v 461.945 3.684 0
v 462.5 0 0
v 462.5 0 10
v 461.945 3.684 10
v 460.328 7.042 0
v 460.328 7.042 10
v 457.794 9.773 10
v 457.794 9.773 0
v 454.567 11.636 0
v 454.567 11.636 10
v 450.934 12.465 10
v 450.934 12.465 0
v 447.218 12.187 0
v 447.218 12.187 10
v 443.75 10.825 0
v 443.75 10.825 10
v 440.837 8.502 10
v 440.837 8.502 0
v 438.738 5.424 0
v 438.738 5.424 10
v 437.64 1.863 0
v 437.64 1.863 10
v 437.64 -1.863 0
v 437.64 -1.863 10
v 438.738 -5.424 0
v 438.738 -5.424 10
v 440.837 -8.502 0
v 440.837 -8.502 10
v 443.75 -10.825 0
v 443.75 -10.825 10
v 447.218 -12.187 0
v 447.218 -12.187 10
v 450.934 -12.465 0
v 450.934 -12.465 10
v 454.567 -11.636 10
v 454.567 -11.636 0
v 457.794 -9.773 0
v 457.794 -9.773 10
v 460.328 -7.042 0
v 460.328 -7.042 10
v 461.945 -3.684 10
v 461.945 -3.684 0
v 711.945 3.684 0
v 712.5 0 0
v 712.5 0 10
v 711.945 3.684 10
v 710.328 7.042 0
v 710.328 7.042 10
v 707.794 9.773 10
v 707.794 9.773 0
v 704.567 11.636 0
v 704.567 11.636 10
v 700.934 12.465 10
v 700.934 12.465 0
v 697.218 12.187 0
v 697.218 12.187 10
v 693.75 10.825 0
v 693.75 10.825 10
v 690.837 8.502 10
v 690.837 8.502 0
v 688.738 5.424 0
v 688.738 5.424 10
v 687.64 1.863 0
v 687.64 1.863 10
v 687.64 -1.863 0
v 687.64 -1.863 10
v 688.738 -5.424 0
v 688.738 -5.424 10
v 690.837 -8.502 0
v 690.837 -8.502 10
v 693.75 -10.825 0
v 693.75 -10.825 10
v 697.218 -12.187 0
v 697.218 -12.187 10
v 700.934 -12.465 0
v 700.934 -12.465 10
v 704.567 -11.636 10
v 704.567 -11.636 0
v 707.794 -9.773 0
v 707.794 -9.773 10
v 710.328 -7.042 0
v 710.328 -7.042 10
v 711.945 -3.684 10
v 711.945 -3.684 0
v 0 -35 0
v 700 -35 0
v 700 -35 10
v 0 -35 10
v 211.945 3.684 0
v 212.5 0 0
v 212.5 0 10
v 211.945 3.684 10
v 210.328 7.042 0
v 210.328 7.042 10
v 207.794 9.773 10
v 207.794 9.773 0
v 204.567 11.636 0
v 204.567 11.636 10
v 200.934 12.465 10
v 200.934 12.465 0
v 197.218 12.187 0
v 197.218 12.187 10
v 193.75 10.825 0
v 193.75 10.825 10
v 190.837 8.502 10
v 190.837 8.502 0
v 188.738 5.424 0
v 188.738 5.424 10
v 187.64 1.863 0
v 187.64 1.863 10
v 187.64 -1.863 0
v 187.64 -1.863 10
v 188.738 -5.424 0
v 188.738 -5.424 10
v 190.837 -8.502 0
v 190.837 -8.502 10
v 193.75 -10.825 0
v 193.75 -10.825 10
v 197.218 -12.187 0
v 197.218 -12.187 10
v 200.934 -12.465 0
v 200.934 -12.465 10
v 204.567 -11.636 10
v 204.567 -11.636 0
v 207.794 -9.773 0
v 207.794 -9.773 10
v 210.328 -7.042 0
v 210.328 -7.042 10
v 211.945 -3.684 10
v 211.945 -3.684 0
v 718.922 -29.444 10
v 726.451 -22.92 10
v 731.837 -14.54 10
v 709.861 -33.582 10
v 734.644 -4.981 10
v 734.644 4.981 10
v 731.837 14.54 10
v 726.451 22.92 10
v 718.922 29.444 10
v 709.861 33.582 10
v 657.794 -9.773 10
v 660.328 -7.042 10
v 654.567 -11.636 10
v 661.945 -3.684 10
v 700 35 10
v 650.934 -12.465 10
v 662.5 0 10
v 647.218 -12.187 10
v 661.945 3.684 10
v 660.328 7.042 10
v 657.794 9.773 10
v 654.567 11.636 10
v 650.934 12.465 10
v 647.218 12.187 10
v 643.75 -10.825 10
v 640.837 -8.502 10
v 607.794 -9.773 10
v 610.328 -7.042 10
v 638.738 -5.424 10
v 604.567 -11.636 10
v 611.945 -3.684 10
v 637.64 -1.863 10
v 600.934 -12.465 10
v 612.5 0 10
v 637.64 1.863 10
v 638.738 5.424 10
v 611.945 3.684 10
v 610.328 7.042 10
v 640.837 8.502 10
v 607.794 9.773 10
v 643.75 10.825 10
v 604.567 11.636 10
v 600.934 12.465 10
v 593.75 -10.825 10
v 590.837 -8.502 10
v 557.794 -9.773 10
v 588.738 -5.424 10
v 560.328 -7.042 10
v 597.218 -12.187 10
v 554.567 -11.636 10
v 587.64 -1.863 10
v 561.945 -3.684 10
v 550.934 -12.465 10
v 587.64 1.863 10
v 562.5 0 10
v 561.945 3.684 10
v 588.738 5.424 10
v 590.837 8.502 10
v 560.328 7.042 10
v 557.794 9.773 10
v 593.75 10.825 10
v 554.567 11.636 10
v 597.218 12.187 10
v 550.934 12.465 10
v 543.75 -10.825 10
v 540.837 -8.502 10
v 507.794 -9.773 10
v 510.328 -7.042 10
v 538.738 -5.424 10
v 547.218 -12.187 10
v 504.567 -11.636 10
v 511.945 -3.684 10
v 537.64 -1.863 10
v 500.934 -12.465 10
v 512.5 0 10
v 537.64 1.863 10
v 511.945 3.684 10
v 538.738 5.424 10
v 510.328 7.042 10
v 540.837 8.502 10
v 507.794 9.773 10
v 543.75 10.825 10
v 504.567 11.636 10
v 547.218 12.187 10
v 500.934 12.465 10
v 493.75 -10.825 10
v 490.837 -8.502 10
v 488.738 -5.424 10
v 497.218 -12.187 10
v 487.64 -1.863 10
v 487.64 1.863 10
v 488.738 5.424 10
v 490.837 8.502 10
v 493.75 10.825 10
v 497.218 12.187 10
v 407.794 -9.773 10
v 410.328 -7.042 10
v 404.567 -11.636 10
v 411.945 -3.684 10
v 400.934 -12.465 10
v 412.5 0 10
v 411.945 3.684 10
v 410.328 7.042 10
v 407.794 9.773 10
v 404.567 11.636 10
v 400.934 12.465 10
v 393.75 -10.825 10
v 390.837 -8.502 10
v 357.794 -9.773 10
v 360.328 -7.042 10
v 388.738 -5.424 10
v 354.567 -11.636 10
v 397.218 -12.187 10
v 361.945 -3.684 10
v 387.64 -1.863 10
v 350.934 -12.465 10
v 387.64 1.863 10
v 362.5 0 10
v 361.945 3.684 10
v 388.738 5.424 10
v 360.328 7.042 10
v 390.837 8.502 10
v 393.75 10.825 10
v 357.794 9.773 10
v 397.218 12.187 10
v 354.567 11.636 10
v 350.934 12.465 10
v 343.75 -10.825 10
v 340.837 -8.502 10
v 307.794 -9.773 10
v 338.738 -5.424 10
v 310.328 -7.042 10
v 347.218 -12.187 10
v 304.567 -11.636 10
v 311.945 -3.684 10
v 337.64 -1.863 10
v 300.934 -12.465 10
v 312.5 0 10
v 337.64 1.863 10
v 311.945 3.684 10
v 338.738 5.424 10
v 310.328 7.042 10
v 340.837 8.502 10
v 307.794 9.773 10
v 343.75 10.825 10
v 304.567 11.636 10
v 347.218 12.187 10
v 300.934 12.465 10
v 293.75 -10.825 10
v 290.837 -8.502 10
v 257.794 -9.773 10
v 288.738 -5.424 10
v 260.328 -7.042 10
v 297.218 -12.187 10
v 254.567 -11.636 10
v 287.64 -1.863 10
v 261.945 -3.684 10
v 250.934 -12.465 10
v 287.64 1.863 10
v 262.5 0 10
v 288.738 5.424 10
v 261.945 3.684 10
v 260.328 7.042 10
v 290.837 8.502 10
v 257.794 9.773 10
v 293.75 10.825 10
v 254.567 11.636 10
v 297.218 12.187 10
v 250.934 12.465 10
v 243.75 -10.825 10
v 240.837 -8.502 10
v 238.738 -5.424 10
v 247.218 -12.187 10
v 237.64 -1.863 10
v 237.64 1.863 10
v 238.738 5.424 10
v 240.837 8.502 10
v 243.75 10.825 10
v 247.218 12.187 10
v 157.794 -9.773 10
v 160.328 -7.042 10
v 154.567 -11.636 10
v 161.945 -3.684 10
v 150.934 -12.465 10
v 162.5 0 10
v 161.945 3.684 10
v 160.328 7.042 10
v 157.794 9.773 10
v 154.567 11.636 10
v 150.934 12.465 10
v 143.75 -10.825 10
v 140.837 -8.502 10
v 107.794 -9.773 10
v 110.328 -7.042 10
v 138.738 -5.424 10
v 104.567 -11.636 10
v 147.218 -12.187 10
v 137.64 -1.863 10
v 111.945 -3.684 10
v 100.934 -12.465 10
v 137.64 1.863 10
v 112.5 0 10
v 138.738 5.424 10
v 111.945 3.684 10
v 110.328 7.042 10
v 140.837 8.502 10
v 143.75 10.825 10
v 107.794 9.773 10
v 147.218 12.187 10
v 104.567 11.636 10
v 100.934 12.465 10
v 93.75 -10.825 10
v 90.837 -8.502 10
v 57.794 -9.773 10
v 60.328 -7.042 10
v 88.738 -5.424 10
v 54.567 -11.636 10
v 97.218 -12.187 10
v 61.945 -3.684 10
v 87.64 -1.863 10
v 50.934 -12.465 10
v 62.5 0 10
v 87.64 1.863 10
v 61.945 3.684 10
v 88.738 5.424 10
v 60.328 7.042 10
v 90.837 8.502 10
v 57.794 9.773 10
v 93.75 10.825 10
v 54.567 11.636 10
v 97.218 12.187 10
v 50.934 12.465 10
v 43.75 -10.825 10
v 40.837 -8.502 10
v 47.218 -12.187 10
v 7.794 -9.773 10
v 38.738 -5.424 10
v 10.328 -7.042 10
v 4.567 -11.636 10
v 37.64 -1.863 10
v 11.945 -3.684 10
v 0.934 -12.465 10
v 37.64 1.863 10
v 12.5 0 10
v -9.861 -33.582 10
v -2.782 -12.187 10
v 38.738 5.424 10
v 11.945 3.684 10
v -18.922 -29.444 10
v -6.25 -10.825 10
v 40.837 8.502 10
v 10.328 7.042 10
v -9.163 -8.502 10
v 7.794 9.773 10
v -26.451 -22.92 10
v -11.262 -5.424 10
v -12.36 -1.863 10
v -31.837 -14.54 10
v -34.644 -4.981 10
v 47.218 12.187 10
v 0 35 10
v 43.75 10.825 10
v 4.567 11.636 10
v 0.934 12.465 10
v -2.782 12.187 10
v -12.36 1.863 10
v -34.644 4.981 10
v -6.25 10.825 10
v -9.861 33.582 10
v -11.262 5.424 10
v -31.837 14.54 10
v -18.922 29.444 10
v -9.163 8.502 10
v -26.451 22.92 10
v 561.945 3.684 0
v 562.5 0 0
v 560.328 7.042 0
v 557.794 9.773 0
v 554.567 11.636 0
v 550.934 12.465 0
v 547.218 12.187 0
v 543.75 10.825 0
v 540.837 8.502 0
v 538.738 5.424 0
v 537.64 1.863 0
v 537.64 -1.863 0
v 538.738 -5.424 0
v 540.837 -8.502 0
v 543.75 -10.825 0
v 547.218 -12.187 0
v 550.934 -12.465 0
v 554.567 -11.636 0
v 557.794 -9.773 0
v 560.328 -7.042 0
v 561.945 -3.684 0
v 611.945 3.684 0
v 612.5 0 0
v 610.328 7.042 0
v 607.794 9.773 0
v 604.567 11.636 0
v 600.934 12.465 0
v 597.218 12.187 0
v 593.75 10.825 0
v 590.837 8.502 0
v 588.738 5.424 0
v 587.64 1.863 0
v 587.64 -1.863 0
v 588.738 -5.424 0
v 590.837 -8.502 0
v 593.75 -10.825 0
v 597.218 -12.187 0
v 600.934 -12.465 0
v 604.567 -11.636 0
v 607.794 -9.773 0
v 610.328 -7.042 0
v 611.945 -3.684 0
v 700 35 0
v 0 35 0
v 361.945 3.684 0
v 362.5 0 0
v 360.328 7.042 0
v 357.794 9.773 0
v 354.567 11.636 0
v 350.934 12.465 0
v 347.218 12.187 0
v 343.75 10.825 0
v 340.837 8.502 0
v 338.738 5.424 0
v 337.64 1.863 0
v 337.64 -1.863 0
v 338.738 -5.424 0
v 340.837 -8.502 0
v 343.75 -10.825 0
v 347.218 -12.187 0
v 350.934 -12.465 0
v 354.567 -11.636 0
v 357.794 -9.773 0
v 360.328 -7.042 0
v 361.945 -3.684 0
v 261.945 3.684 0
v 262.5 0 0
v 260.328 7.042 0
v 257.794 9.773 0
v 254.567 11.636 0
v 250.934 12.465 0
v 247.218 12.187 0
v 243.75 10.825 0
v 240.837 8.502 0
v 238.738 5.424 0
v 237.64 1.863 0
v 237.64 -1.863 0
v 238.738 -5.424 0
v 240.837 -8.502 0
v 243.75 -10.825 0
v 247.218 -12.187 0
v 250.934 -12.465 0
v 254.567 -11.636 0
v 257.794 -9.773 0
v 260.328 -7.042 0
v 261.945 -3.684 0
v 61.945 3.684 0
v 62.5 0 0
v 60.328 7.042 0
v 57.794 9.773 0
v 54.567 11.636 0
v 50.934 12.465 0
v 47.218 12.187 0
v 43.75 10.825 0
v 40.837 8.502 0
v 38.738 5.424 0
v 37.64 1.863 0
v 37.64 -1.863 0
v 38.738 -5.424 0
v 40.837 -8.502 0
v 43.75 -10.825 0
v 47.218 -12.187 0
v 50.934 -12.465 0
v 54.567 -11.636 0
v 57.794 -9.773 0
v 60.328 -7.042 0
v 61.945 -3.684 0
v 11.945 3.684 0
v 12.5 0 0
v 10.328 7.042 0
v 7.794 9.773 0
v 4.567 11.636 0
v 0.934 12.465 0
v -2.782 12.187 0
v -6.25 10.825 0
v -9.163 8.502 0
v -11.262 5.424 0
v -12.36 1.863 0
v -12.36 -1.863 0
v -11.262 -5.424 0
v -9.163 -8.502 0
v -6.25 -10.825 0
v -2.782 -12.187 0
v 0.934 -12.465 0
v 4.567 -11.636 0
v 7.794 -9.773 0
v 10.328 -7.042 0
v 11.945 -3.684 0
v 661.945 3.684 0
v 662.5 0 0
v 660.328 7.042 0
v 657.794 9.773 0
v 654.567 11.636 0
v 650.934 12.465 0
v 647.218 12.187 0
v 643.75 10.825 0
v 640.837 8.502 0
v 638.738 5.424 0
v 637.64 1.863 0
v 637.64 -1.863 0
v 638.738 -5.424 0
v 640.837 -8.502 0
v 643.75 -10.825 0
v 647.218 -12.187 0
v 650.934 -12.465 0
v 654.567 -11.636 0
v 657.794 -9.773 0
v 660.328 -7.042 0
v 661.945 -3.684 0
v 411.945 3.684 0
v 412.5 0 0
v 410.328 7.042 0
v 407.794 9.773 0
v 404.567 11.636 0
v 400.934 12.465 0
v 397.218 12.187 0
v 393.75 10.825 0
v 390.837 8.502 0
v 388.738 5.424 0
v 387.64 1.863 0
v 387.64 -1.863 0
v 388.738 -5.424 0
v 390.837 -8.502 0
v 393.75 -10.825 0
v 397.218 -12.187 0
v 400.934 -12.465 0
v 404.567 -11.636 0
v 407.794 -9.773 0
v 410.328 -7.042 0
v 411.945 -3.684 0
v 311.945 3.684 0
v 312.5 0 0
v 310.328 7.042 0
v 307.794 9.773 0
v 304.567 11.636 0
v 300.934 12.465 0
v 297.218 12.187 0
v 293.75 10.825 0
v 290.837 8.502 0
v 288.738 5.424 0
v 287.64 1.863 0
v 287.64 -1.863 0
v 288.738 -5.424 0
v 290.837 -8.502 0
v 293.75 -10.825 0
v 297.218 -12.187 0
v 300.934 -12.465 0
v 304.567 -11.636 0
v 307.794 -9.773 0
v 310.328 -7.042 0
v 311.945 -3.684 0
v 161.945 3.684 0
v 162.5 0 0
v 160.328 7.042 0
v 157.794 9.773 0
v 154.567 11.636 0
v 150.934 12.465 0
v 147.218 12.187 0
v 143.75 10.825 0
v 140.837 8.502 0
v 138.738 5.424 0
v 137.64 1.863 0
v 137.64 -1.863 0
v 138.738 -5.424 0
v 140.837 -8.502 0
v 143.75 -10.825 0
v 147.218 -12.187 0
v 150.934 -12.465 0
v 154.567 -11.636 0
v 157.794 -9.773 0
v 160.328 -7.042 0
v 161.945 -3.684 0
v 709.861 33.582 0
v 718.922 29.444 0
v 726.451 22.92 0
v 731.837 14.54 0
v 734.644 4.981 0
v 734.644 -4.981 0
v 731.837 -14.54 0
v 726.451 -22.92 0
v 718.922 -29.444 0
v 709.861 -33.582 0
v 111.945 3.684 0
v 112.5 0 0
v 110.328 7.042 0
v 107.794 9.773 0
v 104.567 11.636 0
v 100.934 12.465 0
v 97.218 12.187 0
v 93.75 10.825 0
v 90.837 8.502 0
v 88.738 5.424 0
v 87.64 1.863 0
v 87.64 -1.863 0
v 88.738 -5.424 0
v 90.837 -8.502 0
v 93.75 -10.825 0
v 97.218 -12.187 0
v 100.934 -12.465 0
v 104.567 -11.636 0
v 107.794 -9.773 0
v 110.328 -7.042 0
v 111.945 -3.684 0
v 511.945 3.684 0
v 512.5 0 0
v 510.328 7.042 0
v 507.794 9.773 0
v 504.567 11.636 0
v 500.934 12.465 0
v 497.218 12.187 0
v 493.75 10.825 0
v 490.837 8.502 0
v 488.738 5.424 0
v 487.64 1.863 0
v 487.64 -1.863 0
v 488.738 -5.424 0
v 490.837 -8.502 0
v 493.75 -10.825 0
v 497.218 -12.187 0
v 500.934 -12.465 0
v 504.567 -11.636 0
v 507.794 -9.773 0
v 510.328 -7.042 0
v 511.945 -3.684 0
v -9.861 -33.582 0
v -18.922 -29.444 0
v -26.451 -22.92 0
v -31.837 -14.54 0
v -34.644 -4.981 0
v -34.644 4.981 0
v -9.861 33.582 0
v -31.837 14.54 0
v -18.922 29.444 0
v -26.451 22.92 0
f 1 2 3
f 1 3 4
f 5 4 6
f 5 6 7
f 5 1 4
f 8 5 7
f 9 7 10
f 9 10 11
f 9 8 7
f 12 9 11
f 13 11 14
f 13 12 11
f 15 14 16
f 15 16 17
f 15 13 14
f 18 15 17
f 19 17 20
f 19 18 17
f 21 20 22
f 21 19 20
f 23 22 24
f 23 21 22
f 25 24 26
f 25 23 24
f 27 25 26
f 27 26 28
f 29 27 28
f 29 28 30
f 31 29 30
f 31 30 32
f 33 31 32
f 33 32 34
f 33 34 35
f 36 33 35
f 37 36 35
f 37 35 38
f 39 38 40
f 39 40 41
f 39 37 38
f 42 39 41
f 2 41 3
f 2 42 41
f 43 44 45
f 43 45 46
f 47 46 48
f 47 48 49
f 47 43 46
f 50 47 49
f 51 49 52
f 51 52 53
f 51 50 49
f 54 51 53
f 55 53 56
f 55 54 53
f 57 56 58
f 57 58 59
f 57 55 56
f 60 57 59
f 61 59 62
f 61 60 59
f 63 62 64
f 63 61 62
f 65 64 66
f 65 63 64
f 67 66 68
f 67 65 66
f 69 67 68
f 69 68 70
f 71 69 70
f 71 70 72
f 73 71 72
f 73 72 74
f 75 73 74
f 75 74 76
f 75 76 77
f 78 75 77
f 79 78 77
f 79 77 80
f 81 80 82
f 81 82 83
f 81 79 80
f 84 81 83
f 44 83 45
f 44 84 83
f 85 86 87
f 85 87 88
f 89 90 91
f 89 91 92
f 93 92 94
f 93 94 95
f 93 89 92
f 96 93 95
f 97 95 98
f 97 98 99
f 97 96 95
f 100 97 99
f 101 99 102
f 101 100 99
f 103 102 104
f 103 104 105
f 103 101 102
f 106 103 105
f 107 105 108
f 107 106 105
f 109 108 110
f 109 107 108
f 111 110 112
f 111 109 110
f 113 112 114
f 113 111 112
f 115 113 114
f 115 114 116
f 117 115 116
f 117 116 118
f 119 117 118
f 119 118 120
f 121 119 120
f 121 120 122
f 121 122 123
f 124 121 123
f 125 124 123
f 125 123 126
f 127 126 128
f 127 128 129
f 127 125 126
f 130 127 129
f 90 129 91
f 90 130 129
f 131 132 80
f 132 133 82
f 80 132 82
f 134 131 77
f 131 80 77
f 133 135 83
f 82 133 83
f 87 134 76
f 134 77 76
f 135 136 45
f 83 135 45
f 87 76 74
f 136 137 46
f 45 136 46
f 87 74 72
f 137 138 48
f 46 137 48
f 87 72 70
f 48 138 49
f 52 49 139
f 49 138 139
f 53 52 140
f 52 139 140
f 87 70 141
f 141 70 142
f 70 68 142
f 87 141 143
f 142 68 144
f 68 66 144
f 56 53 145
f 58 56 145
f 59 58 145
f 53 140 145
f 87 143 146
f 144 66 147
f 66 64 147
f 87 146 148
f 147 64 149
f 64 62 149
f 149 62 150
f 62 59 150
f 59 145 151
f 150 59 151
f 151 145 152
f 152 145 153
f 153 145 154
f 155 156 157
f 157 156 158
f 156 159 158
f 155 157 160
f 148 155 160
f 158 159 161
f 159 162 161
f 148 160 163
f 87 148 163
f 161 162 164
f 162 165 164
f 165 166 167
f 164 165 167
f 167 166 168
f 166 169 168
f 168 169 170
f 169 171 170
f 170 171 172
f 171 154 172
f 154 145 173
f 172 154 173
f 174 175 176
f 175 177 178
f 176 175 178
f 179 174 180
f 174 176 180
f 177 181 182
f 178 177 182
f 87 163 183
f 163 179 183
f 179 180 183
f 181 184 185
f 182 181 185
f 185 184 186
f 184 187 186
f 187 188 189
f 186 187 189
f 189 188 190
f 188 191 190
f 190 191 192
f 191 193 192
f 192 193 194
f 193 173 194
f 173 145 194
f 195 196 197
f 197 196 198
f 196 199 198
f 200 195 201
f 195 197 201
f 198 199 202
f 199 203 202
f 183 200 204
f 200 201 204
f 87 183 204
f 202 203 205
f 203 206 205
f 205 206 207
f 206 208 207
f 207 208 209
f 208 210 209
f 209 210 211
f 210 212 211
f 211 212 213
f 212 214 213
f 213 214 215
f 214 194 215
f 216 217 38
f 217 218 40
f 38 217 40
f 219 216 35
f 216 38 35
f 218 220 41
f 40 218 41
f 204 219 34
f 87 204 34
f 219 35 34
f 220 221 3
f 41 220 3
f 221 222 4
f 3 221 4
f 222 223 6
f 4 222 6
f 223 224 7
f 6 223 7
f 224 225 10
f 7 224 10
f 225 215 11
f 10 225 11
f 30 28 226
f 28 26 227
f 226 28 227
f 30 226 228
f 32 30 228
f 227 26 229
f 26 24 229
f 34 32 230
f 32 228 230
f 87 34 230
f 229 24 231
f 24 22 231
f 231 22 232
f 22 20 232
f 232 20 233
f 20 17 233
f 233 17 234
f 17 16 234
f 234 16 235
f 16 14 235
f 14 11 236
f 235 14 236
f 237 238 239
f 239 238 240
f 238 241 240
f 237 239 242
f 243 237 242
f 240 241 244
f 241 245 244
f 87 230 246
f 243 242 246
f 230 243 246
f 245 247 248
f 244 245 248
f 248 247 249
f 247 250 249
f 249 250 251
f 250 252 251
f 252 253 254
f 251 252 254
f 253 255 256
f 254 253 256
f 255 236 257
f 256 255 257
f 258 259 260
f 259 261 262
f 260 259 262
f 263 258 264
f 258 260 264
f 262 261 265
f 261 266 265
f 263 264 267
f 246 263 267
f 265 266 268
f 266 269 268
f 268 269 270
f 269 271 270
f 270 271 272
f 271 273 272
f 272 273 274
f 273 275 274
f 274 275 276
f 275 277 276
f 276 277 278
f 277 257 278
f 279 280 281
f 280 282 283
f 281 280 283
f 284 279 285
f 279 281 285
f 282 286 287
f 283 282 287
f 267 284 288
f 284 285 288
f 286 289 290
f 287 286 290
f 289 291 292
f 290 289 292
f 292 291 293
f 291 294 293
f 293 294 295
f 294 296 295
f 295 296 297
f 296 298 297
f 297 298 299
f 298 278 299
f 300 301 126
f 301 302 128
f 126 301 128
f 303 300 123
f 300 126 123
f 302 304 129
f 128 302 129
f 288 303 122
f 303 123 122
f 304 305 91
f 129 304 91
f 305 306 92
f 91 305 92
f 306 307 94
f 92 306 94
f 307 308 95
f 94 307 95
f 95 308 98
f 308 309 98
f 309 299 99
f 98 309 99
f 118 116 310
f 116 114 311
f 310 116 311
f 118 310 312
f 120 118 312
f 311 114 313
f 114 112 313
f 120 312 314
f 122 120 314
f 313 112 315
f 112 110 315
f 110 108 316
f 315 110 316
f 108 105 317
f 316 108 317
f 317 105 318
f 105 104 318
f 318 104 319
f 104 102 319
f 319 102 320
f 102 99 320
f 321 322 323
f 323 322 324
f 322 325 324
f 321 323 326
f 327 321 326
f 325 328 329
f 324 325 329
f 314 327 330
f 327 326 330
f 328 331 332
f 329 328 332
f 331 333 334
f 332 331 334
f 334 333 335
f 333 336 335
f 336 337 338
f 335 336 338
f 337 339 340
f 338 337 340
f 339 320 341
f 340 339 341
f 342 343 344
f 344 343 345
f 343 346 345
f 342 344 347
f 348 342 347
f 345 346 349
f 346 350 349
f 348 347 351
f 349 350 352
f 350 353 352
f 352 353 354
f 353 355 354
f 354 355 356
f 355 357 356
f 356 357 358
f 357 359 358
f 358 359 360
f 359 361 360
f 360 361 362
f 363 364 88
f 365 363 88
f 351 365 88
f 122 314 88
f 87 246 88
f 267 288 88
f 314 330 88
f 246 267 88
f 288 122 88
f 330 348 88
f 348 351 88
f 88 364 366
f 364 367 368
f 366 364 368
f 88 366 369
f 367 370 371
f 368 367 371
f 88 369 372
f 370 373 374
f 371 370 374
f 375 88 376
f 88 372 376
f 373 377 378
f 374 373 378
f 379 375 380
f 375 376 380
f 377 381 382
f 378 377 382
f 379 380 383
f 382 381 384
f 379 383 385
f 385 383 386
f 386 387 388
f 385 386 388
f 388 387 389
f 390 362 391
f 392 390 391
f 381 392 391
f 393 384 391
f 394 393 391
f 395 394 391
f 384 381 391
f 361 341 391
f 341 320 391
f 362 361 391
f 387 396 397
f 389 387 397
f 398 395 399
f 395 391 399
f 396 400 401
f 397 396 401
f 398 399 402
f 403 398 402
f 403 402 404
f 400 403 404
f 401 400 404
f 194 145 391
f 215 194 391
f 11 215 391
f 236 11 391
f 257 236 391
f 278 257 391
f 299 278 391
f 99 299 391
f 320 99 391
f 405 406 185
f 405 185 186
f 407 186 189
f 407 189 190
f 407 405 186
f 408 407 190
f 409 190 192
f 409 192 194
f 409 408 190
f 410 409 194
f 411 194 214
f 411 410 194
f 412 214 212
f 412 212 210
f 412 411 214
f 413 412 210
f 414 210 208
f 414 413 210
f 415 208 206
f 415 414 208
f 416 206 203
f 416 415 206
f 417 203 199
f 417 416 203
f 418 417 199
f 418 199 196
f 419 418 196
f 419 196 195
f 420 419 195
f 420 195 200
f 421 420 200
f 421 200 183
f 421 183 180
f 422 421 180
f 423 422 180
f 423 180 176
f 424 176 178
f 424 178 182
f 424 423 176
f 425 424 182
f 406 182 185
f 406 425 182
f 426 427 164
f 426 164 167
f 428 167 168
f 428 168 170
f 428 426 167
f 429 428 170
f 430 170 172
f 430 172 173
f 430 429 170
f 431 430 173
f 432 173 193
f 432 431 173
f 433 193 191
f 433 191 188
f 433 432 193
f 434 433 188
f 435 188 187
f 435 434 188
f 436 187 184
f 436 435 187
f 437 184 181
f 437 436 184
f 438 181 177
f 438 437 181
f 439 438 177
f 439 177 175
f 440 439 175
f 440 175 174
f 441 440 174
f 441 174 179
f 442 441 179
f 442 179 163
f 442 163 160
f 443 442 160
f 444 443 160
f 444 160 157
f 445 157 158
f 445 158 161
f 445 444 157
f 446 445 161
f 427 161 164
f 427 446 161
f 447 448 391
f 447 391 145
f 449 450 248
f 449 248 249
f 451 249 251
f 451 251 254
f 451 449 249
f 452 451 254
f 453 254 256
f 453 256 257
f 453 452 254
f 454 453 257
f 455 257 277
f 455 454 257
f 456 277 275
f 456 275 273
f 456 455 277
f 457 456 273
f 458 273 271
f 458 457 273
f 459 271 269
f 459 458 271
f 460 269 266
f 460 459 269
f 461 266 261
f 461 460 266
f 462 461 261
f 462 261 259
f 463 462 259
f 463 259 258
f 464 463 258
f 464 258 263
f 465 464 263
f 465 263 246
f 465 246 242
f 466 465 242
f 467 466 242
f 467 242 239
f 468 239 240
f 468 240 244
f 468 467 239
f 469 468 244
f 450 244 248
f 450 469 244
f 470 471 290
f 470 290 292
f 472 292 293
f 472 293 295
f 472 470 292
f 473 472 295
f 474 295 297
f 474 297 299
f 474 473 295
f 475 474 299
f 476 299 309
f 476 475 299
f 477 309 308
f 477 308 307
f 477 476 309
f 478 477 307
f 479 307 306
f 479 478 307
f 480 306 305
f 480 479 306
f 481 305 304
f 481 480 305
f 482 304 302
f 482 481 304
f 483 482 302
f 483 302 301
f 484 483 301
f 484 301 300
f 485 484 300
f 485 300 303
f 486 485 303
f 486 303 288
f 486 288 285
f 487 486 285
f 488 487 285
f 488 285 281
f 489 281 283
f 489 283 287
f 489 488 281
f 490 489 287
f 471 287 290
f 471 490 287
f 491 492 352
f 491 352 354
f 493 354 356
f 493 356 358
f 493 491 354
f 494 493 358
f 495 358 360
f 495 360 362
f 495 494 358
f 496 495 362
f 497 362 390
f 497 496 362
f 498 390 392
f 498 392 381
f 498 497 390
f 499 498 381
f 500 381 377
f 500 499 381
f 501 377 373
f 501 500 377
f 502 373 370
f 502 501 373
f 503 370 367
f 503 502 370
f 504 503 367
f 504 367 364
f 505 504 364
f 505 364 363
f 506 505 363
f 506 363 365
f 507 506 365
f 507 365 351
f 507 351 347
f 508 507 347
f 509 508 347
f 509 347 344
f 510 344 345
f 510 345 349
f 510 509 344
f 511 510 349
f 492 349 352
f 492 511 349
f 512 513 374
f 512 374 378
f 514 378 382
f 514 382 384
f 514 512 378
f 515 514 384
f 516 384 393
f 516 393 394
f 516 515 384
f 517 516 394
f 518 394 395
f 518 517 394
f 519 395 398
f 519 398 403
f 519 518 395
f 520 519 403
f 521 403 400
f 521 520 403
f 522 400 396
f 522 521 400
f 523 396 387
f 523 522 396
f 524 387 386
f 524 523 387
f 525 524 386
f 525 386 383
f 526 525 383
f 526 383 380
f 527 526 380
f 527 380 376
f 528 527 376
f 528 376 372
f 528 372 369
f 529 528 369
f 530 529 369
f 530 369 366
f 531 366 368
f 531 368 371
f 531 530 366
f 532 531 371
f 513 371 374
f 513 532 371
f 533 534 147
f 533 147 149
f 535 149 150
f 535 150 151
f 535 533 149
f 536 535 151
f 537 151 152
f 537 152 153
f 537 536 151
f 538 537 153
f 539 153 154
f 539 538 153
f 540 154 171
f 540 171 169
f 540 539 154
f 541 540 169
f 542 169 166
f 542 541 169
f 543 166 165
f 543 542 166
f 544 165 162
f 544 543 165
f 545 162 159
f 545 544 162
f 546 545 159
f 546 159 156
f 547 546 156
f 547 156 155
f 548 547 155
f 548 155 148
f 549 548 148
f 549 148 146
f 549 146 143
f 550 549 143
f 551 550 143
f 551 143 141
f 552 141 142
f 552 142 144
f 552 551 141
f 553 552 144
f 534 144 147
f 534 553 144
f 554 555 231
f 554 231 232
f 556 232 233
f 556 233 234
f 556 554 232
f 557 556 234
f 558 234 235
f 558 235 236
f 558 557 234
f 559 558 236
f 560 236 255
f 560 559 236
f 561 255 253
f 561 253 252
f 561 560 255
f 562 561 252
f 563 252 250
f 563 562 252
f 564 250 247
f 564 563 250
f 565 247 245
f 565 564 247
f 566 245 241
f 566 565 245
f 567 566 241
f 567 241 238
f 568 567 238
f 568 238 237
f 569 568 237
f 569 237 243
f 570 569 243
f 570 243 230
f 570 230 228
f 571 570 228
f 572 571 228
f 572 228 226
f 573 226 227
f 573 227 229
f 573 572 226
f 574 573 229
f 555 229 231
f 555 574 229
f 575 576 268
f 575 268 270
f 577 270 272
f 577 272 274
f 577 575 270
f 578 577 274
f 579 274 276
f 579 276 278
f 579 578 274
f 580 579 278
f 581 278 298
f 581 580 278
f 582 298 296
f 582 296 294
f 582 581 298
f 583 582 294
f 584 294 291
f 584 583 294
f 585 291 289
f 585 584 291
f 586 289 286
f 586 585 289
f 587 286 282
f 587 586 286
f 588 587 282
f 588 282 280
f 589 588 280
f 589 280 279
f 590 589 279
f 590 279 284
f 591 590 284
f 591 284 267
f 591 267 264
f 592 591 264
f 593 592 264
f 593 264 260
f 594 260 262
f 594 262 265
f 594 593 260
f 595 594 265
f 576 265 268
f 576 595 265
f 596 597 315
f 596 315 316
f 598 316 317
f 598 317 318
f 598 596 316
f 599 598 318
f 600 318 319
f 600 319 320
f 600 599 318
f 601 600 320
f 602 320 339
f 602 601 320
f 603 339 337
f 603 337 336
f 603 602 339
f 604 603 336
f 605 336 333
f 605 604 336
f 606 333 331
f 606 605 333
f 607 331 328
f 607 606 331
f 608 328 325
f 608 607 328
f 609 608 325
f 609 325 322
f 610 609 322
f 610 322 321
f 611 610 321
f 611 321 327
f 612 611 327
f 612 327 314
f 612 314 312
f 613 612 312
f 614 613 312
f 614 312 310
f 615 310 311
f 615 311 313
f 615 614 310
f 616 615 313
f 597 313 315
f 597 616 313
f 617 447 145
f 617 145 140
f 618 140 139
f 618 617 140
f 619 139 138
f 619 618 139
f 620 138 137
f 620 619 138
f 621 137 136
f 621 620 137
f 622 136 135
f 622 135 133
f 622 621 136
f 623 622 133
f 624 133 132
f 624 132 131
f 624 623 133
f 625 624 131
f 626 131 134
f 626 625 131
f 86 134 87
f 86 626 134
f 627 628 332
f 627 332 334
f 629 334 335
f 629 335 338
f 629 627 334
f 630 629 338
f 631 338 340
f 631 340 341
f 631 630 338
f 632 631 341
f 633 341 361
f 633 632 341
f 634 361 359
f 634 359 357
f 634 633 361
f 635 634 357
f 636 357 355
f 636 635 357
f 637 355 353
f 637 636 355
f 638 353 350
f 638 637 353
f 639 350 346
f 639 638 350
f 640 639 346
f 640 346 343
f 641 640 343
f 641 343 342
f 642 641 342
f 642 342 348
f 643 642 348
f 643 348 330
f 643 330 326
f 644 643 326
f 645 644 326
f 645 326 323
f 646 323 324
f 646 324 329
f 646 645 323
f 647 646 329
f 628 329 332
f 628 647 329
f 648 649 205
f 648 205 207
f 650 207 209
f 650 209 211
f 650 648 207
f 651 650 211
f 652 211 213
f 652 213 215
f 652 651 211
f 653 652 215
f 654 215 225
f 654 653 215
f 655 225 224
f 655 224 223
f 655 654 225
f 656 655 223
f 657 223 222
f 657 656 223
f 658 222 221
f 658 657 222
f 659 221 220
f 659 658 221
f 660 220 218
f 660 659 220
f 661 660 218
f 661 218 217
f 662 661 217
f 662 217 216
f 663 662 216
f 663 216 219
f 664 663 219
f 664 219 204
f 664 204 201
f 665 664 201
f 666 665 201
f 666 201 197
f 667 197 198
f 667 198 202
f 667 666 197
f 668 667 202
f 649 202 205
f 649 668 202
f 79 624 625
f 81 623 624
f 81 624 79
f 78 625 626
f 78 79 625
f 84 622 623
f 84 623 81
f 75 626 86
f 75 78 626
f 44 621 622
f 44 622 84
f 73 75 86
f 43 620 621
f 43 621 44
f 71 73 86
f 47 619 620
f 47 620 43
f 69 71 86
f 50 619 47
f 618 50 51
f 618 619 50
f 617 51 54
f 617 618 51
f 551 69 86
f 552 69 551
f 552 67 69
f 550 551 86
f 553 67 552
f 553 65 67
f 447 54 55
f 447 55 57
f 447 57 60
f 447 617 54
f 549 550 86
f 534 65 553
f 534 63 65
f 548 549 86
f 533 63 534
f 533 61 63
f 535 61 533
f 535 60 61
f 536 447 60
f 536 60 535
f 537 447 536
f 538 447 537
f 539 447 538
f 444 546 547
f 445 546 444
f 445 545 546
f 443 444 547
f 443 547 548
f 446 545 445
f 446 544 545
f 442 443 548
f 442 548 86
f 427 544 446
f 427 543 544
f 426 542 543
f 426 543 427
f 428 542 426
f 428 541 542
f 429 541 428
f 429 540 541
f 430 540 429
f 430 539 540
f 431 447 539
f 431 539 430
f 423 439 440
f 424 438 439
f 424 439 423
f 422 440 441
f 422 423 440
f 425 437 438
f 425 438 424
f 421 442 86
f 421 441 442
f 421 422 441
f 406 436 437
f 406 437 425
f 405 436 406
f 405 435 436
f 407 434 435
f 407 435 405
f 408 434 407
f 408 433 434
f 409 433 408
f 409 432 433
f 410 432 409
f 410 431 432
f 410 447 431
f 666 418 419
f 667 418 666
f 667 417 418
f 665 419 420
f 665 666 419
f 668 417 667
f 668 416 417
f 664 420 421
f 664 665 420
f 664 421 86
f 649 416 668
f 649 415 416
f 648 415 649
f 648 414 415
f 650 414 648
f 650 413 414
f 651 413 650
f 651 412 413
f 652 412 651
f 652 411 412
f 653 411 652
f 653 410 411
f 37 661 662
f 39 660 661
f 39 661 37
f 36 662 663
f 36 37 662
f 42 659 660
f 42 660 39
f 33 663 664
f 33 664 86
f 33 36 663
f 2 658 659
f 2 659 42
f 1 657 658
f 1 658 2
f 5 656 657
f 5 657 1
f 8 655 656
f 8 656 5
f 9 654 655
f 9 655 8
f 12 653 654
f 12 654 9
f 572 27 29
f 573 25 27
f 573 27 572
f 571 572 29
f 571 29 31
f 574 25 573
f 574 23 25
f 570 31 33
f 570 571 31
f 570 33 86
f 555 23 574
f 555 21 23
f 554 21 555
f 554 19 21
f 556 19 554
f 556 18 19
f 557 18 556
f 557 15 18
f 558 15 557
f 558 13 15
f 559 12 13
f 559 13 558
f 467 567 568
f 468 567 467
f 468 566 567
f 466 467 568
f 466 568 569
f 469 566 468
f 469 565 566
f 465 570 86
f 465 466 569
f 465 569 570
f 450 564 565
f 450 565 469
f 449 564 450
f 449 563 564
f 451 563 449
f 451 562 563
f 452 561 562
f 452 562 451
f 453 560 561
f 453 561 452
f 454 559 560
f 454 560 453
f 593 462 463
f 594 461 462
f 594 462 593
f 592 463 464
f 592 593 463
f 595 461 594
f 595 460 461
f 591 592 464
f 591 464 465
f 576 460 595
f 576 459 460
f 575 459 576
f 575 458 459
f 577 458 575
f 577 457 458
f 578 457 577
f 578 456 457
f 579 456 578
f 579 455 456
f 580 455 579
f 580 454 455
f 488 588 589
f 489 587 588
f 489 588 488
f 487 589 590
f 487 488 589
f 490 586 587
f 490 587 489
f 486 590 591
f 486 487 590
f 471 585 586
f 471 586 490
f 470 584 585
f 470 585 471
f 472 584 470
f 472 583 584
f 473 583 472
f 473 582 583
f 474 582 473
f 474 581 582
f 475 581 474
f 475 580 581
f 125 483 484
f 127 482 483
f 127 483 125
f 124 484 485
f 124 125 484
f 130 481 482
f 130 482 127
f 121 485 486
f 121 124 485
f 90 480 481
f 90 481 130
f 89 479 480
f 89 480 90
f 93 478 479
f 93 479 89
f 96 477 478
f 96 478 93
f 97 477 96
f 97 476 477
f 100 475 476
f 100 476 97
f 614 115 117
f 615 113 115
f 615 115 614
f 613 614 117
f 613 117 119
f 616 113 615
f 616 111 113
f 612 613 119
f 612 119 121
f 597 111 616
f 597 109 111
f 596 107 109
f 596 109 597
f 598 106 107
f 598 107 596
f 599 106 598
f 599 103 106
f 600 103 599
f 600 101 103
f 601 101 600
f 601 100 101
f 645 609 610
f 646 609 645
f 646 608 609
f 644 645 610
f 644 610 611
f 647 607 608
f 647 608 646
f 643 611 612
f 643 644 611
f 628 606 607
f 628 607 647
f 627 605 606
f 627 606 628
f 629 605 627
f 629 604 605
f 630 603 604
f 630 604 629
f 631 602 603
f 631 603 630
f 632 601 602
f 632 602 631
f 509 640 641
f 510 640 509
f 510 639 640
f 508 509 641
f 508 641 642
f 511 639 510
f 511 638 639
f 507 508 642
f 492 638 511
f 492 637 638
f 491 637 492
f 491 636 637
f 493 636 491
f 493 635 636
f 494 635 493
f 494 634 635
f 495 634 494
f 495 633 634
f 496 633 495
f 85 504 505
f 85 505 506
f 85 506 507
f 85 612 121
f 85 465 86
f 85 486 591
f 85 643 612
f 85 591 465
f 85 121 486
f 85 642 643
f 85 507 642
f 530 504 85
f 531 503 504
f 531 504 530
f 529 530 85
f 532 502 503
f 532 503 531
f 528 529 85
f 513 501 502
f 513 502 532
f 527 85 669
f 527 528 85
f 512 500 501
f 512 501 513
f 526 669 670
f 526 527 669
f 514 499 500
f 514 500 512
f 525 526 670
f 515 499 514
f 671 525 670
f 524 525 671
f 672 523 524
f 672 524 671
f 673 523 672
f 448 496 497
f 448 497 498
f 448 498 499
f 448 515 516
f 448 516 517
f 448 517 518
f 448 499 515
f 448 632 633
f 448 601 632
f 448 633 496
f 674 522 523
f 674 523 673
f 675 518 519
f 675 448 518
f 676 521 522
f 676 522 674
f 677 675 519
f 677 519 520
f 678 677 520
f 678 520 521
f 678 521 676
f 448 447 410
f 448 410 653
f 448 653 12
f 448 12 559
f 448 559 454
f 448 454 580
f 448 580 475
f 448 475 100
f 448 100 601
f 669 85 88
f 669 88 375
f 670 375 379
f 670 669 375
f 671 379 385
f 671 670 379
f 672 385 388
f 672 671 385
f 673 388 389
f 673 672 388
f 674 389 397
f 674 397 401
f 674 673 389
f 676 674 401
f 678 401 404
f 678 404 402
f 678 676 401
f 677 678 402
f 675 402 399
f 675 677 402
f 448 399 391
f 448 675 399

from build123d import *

# Parameters (mm, degrees)
SKETCH1_R           = 12.5
BOSS_EXTRUDE1_DEPTH = 10


with BuildPart() as part:
    # Sketch1 → Boss-Extrude1 (new body)
    with BuildSketch(Plane.XY):
        with BuildLine():
            Line((0, 35), (700, 35))
            ThreePointArc((700, 35), (735, 0), (700, -35))
            Line((700, -35), (0, -35))
            ThreePointArc((0, -35), (-35, 0), (0, 35))
        make_face()
        Circle(SKETCH1_R, mode=Mode.SUBTRACT)
        with Locations((50, 0)):
            Circle(SKETCH1_R, mode=Mode.SUBTRACT)
        with Locations((100, 0)):
            Circle(SKETCH1_R, mode=Mode.SUBTRACT)
        with Locations((150, 0)):
            Circle(SKETCH1_R, mode=Mode.SUBTRACT)
        with Locations((200, 0)):
            Circle(SKETCH1_R, mode=Mode.SUBTRACT)
        with Locations((250, 0)):
            Circle(SKETCH1_R, mode=Mode.SUBTRACT)
        with Locations((300, 0)):
            Circle(SKETCH1_R, mode=Mode.SUBTRACT)
        with Locations((350, 0)):
            Circle(SKETCH1_R, mode=Mode.SUBTRACT)
        with Locations((400, 0)):
            Circle(SKETCH1_R, mode=Mode.SUBTRACT)
        with Locations((450, 0)):
            Circle(SKETCH1_R, mode=Mode.SUBTRACT)
        with Locations((500, 0)):
            Circle(SKETCH1_R, mode=Mode.SUBTRACT)
        with Locations((550, 0)):
            Circle(SKETCH1_R, mode=Mode.SUBTRACT)
        with Locations((600, 0)):
            Circle(SKETCH1_R, mode=Mode.SUBTRACT)
        with Locations((650, 0)):
            Circle(SKETCH1_R, mode=Mode.SUBTRACT)
        with Locations((700, 0)):
            Circle(SKETCH1_R, mode=Mode.SUBTRACT)
    extrude(amount=BOSS_EXTRUDE1_DEPTH)


solid = part.part
